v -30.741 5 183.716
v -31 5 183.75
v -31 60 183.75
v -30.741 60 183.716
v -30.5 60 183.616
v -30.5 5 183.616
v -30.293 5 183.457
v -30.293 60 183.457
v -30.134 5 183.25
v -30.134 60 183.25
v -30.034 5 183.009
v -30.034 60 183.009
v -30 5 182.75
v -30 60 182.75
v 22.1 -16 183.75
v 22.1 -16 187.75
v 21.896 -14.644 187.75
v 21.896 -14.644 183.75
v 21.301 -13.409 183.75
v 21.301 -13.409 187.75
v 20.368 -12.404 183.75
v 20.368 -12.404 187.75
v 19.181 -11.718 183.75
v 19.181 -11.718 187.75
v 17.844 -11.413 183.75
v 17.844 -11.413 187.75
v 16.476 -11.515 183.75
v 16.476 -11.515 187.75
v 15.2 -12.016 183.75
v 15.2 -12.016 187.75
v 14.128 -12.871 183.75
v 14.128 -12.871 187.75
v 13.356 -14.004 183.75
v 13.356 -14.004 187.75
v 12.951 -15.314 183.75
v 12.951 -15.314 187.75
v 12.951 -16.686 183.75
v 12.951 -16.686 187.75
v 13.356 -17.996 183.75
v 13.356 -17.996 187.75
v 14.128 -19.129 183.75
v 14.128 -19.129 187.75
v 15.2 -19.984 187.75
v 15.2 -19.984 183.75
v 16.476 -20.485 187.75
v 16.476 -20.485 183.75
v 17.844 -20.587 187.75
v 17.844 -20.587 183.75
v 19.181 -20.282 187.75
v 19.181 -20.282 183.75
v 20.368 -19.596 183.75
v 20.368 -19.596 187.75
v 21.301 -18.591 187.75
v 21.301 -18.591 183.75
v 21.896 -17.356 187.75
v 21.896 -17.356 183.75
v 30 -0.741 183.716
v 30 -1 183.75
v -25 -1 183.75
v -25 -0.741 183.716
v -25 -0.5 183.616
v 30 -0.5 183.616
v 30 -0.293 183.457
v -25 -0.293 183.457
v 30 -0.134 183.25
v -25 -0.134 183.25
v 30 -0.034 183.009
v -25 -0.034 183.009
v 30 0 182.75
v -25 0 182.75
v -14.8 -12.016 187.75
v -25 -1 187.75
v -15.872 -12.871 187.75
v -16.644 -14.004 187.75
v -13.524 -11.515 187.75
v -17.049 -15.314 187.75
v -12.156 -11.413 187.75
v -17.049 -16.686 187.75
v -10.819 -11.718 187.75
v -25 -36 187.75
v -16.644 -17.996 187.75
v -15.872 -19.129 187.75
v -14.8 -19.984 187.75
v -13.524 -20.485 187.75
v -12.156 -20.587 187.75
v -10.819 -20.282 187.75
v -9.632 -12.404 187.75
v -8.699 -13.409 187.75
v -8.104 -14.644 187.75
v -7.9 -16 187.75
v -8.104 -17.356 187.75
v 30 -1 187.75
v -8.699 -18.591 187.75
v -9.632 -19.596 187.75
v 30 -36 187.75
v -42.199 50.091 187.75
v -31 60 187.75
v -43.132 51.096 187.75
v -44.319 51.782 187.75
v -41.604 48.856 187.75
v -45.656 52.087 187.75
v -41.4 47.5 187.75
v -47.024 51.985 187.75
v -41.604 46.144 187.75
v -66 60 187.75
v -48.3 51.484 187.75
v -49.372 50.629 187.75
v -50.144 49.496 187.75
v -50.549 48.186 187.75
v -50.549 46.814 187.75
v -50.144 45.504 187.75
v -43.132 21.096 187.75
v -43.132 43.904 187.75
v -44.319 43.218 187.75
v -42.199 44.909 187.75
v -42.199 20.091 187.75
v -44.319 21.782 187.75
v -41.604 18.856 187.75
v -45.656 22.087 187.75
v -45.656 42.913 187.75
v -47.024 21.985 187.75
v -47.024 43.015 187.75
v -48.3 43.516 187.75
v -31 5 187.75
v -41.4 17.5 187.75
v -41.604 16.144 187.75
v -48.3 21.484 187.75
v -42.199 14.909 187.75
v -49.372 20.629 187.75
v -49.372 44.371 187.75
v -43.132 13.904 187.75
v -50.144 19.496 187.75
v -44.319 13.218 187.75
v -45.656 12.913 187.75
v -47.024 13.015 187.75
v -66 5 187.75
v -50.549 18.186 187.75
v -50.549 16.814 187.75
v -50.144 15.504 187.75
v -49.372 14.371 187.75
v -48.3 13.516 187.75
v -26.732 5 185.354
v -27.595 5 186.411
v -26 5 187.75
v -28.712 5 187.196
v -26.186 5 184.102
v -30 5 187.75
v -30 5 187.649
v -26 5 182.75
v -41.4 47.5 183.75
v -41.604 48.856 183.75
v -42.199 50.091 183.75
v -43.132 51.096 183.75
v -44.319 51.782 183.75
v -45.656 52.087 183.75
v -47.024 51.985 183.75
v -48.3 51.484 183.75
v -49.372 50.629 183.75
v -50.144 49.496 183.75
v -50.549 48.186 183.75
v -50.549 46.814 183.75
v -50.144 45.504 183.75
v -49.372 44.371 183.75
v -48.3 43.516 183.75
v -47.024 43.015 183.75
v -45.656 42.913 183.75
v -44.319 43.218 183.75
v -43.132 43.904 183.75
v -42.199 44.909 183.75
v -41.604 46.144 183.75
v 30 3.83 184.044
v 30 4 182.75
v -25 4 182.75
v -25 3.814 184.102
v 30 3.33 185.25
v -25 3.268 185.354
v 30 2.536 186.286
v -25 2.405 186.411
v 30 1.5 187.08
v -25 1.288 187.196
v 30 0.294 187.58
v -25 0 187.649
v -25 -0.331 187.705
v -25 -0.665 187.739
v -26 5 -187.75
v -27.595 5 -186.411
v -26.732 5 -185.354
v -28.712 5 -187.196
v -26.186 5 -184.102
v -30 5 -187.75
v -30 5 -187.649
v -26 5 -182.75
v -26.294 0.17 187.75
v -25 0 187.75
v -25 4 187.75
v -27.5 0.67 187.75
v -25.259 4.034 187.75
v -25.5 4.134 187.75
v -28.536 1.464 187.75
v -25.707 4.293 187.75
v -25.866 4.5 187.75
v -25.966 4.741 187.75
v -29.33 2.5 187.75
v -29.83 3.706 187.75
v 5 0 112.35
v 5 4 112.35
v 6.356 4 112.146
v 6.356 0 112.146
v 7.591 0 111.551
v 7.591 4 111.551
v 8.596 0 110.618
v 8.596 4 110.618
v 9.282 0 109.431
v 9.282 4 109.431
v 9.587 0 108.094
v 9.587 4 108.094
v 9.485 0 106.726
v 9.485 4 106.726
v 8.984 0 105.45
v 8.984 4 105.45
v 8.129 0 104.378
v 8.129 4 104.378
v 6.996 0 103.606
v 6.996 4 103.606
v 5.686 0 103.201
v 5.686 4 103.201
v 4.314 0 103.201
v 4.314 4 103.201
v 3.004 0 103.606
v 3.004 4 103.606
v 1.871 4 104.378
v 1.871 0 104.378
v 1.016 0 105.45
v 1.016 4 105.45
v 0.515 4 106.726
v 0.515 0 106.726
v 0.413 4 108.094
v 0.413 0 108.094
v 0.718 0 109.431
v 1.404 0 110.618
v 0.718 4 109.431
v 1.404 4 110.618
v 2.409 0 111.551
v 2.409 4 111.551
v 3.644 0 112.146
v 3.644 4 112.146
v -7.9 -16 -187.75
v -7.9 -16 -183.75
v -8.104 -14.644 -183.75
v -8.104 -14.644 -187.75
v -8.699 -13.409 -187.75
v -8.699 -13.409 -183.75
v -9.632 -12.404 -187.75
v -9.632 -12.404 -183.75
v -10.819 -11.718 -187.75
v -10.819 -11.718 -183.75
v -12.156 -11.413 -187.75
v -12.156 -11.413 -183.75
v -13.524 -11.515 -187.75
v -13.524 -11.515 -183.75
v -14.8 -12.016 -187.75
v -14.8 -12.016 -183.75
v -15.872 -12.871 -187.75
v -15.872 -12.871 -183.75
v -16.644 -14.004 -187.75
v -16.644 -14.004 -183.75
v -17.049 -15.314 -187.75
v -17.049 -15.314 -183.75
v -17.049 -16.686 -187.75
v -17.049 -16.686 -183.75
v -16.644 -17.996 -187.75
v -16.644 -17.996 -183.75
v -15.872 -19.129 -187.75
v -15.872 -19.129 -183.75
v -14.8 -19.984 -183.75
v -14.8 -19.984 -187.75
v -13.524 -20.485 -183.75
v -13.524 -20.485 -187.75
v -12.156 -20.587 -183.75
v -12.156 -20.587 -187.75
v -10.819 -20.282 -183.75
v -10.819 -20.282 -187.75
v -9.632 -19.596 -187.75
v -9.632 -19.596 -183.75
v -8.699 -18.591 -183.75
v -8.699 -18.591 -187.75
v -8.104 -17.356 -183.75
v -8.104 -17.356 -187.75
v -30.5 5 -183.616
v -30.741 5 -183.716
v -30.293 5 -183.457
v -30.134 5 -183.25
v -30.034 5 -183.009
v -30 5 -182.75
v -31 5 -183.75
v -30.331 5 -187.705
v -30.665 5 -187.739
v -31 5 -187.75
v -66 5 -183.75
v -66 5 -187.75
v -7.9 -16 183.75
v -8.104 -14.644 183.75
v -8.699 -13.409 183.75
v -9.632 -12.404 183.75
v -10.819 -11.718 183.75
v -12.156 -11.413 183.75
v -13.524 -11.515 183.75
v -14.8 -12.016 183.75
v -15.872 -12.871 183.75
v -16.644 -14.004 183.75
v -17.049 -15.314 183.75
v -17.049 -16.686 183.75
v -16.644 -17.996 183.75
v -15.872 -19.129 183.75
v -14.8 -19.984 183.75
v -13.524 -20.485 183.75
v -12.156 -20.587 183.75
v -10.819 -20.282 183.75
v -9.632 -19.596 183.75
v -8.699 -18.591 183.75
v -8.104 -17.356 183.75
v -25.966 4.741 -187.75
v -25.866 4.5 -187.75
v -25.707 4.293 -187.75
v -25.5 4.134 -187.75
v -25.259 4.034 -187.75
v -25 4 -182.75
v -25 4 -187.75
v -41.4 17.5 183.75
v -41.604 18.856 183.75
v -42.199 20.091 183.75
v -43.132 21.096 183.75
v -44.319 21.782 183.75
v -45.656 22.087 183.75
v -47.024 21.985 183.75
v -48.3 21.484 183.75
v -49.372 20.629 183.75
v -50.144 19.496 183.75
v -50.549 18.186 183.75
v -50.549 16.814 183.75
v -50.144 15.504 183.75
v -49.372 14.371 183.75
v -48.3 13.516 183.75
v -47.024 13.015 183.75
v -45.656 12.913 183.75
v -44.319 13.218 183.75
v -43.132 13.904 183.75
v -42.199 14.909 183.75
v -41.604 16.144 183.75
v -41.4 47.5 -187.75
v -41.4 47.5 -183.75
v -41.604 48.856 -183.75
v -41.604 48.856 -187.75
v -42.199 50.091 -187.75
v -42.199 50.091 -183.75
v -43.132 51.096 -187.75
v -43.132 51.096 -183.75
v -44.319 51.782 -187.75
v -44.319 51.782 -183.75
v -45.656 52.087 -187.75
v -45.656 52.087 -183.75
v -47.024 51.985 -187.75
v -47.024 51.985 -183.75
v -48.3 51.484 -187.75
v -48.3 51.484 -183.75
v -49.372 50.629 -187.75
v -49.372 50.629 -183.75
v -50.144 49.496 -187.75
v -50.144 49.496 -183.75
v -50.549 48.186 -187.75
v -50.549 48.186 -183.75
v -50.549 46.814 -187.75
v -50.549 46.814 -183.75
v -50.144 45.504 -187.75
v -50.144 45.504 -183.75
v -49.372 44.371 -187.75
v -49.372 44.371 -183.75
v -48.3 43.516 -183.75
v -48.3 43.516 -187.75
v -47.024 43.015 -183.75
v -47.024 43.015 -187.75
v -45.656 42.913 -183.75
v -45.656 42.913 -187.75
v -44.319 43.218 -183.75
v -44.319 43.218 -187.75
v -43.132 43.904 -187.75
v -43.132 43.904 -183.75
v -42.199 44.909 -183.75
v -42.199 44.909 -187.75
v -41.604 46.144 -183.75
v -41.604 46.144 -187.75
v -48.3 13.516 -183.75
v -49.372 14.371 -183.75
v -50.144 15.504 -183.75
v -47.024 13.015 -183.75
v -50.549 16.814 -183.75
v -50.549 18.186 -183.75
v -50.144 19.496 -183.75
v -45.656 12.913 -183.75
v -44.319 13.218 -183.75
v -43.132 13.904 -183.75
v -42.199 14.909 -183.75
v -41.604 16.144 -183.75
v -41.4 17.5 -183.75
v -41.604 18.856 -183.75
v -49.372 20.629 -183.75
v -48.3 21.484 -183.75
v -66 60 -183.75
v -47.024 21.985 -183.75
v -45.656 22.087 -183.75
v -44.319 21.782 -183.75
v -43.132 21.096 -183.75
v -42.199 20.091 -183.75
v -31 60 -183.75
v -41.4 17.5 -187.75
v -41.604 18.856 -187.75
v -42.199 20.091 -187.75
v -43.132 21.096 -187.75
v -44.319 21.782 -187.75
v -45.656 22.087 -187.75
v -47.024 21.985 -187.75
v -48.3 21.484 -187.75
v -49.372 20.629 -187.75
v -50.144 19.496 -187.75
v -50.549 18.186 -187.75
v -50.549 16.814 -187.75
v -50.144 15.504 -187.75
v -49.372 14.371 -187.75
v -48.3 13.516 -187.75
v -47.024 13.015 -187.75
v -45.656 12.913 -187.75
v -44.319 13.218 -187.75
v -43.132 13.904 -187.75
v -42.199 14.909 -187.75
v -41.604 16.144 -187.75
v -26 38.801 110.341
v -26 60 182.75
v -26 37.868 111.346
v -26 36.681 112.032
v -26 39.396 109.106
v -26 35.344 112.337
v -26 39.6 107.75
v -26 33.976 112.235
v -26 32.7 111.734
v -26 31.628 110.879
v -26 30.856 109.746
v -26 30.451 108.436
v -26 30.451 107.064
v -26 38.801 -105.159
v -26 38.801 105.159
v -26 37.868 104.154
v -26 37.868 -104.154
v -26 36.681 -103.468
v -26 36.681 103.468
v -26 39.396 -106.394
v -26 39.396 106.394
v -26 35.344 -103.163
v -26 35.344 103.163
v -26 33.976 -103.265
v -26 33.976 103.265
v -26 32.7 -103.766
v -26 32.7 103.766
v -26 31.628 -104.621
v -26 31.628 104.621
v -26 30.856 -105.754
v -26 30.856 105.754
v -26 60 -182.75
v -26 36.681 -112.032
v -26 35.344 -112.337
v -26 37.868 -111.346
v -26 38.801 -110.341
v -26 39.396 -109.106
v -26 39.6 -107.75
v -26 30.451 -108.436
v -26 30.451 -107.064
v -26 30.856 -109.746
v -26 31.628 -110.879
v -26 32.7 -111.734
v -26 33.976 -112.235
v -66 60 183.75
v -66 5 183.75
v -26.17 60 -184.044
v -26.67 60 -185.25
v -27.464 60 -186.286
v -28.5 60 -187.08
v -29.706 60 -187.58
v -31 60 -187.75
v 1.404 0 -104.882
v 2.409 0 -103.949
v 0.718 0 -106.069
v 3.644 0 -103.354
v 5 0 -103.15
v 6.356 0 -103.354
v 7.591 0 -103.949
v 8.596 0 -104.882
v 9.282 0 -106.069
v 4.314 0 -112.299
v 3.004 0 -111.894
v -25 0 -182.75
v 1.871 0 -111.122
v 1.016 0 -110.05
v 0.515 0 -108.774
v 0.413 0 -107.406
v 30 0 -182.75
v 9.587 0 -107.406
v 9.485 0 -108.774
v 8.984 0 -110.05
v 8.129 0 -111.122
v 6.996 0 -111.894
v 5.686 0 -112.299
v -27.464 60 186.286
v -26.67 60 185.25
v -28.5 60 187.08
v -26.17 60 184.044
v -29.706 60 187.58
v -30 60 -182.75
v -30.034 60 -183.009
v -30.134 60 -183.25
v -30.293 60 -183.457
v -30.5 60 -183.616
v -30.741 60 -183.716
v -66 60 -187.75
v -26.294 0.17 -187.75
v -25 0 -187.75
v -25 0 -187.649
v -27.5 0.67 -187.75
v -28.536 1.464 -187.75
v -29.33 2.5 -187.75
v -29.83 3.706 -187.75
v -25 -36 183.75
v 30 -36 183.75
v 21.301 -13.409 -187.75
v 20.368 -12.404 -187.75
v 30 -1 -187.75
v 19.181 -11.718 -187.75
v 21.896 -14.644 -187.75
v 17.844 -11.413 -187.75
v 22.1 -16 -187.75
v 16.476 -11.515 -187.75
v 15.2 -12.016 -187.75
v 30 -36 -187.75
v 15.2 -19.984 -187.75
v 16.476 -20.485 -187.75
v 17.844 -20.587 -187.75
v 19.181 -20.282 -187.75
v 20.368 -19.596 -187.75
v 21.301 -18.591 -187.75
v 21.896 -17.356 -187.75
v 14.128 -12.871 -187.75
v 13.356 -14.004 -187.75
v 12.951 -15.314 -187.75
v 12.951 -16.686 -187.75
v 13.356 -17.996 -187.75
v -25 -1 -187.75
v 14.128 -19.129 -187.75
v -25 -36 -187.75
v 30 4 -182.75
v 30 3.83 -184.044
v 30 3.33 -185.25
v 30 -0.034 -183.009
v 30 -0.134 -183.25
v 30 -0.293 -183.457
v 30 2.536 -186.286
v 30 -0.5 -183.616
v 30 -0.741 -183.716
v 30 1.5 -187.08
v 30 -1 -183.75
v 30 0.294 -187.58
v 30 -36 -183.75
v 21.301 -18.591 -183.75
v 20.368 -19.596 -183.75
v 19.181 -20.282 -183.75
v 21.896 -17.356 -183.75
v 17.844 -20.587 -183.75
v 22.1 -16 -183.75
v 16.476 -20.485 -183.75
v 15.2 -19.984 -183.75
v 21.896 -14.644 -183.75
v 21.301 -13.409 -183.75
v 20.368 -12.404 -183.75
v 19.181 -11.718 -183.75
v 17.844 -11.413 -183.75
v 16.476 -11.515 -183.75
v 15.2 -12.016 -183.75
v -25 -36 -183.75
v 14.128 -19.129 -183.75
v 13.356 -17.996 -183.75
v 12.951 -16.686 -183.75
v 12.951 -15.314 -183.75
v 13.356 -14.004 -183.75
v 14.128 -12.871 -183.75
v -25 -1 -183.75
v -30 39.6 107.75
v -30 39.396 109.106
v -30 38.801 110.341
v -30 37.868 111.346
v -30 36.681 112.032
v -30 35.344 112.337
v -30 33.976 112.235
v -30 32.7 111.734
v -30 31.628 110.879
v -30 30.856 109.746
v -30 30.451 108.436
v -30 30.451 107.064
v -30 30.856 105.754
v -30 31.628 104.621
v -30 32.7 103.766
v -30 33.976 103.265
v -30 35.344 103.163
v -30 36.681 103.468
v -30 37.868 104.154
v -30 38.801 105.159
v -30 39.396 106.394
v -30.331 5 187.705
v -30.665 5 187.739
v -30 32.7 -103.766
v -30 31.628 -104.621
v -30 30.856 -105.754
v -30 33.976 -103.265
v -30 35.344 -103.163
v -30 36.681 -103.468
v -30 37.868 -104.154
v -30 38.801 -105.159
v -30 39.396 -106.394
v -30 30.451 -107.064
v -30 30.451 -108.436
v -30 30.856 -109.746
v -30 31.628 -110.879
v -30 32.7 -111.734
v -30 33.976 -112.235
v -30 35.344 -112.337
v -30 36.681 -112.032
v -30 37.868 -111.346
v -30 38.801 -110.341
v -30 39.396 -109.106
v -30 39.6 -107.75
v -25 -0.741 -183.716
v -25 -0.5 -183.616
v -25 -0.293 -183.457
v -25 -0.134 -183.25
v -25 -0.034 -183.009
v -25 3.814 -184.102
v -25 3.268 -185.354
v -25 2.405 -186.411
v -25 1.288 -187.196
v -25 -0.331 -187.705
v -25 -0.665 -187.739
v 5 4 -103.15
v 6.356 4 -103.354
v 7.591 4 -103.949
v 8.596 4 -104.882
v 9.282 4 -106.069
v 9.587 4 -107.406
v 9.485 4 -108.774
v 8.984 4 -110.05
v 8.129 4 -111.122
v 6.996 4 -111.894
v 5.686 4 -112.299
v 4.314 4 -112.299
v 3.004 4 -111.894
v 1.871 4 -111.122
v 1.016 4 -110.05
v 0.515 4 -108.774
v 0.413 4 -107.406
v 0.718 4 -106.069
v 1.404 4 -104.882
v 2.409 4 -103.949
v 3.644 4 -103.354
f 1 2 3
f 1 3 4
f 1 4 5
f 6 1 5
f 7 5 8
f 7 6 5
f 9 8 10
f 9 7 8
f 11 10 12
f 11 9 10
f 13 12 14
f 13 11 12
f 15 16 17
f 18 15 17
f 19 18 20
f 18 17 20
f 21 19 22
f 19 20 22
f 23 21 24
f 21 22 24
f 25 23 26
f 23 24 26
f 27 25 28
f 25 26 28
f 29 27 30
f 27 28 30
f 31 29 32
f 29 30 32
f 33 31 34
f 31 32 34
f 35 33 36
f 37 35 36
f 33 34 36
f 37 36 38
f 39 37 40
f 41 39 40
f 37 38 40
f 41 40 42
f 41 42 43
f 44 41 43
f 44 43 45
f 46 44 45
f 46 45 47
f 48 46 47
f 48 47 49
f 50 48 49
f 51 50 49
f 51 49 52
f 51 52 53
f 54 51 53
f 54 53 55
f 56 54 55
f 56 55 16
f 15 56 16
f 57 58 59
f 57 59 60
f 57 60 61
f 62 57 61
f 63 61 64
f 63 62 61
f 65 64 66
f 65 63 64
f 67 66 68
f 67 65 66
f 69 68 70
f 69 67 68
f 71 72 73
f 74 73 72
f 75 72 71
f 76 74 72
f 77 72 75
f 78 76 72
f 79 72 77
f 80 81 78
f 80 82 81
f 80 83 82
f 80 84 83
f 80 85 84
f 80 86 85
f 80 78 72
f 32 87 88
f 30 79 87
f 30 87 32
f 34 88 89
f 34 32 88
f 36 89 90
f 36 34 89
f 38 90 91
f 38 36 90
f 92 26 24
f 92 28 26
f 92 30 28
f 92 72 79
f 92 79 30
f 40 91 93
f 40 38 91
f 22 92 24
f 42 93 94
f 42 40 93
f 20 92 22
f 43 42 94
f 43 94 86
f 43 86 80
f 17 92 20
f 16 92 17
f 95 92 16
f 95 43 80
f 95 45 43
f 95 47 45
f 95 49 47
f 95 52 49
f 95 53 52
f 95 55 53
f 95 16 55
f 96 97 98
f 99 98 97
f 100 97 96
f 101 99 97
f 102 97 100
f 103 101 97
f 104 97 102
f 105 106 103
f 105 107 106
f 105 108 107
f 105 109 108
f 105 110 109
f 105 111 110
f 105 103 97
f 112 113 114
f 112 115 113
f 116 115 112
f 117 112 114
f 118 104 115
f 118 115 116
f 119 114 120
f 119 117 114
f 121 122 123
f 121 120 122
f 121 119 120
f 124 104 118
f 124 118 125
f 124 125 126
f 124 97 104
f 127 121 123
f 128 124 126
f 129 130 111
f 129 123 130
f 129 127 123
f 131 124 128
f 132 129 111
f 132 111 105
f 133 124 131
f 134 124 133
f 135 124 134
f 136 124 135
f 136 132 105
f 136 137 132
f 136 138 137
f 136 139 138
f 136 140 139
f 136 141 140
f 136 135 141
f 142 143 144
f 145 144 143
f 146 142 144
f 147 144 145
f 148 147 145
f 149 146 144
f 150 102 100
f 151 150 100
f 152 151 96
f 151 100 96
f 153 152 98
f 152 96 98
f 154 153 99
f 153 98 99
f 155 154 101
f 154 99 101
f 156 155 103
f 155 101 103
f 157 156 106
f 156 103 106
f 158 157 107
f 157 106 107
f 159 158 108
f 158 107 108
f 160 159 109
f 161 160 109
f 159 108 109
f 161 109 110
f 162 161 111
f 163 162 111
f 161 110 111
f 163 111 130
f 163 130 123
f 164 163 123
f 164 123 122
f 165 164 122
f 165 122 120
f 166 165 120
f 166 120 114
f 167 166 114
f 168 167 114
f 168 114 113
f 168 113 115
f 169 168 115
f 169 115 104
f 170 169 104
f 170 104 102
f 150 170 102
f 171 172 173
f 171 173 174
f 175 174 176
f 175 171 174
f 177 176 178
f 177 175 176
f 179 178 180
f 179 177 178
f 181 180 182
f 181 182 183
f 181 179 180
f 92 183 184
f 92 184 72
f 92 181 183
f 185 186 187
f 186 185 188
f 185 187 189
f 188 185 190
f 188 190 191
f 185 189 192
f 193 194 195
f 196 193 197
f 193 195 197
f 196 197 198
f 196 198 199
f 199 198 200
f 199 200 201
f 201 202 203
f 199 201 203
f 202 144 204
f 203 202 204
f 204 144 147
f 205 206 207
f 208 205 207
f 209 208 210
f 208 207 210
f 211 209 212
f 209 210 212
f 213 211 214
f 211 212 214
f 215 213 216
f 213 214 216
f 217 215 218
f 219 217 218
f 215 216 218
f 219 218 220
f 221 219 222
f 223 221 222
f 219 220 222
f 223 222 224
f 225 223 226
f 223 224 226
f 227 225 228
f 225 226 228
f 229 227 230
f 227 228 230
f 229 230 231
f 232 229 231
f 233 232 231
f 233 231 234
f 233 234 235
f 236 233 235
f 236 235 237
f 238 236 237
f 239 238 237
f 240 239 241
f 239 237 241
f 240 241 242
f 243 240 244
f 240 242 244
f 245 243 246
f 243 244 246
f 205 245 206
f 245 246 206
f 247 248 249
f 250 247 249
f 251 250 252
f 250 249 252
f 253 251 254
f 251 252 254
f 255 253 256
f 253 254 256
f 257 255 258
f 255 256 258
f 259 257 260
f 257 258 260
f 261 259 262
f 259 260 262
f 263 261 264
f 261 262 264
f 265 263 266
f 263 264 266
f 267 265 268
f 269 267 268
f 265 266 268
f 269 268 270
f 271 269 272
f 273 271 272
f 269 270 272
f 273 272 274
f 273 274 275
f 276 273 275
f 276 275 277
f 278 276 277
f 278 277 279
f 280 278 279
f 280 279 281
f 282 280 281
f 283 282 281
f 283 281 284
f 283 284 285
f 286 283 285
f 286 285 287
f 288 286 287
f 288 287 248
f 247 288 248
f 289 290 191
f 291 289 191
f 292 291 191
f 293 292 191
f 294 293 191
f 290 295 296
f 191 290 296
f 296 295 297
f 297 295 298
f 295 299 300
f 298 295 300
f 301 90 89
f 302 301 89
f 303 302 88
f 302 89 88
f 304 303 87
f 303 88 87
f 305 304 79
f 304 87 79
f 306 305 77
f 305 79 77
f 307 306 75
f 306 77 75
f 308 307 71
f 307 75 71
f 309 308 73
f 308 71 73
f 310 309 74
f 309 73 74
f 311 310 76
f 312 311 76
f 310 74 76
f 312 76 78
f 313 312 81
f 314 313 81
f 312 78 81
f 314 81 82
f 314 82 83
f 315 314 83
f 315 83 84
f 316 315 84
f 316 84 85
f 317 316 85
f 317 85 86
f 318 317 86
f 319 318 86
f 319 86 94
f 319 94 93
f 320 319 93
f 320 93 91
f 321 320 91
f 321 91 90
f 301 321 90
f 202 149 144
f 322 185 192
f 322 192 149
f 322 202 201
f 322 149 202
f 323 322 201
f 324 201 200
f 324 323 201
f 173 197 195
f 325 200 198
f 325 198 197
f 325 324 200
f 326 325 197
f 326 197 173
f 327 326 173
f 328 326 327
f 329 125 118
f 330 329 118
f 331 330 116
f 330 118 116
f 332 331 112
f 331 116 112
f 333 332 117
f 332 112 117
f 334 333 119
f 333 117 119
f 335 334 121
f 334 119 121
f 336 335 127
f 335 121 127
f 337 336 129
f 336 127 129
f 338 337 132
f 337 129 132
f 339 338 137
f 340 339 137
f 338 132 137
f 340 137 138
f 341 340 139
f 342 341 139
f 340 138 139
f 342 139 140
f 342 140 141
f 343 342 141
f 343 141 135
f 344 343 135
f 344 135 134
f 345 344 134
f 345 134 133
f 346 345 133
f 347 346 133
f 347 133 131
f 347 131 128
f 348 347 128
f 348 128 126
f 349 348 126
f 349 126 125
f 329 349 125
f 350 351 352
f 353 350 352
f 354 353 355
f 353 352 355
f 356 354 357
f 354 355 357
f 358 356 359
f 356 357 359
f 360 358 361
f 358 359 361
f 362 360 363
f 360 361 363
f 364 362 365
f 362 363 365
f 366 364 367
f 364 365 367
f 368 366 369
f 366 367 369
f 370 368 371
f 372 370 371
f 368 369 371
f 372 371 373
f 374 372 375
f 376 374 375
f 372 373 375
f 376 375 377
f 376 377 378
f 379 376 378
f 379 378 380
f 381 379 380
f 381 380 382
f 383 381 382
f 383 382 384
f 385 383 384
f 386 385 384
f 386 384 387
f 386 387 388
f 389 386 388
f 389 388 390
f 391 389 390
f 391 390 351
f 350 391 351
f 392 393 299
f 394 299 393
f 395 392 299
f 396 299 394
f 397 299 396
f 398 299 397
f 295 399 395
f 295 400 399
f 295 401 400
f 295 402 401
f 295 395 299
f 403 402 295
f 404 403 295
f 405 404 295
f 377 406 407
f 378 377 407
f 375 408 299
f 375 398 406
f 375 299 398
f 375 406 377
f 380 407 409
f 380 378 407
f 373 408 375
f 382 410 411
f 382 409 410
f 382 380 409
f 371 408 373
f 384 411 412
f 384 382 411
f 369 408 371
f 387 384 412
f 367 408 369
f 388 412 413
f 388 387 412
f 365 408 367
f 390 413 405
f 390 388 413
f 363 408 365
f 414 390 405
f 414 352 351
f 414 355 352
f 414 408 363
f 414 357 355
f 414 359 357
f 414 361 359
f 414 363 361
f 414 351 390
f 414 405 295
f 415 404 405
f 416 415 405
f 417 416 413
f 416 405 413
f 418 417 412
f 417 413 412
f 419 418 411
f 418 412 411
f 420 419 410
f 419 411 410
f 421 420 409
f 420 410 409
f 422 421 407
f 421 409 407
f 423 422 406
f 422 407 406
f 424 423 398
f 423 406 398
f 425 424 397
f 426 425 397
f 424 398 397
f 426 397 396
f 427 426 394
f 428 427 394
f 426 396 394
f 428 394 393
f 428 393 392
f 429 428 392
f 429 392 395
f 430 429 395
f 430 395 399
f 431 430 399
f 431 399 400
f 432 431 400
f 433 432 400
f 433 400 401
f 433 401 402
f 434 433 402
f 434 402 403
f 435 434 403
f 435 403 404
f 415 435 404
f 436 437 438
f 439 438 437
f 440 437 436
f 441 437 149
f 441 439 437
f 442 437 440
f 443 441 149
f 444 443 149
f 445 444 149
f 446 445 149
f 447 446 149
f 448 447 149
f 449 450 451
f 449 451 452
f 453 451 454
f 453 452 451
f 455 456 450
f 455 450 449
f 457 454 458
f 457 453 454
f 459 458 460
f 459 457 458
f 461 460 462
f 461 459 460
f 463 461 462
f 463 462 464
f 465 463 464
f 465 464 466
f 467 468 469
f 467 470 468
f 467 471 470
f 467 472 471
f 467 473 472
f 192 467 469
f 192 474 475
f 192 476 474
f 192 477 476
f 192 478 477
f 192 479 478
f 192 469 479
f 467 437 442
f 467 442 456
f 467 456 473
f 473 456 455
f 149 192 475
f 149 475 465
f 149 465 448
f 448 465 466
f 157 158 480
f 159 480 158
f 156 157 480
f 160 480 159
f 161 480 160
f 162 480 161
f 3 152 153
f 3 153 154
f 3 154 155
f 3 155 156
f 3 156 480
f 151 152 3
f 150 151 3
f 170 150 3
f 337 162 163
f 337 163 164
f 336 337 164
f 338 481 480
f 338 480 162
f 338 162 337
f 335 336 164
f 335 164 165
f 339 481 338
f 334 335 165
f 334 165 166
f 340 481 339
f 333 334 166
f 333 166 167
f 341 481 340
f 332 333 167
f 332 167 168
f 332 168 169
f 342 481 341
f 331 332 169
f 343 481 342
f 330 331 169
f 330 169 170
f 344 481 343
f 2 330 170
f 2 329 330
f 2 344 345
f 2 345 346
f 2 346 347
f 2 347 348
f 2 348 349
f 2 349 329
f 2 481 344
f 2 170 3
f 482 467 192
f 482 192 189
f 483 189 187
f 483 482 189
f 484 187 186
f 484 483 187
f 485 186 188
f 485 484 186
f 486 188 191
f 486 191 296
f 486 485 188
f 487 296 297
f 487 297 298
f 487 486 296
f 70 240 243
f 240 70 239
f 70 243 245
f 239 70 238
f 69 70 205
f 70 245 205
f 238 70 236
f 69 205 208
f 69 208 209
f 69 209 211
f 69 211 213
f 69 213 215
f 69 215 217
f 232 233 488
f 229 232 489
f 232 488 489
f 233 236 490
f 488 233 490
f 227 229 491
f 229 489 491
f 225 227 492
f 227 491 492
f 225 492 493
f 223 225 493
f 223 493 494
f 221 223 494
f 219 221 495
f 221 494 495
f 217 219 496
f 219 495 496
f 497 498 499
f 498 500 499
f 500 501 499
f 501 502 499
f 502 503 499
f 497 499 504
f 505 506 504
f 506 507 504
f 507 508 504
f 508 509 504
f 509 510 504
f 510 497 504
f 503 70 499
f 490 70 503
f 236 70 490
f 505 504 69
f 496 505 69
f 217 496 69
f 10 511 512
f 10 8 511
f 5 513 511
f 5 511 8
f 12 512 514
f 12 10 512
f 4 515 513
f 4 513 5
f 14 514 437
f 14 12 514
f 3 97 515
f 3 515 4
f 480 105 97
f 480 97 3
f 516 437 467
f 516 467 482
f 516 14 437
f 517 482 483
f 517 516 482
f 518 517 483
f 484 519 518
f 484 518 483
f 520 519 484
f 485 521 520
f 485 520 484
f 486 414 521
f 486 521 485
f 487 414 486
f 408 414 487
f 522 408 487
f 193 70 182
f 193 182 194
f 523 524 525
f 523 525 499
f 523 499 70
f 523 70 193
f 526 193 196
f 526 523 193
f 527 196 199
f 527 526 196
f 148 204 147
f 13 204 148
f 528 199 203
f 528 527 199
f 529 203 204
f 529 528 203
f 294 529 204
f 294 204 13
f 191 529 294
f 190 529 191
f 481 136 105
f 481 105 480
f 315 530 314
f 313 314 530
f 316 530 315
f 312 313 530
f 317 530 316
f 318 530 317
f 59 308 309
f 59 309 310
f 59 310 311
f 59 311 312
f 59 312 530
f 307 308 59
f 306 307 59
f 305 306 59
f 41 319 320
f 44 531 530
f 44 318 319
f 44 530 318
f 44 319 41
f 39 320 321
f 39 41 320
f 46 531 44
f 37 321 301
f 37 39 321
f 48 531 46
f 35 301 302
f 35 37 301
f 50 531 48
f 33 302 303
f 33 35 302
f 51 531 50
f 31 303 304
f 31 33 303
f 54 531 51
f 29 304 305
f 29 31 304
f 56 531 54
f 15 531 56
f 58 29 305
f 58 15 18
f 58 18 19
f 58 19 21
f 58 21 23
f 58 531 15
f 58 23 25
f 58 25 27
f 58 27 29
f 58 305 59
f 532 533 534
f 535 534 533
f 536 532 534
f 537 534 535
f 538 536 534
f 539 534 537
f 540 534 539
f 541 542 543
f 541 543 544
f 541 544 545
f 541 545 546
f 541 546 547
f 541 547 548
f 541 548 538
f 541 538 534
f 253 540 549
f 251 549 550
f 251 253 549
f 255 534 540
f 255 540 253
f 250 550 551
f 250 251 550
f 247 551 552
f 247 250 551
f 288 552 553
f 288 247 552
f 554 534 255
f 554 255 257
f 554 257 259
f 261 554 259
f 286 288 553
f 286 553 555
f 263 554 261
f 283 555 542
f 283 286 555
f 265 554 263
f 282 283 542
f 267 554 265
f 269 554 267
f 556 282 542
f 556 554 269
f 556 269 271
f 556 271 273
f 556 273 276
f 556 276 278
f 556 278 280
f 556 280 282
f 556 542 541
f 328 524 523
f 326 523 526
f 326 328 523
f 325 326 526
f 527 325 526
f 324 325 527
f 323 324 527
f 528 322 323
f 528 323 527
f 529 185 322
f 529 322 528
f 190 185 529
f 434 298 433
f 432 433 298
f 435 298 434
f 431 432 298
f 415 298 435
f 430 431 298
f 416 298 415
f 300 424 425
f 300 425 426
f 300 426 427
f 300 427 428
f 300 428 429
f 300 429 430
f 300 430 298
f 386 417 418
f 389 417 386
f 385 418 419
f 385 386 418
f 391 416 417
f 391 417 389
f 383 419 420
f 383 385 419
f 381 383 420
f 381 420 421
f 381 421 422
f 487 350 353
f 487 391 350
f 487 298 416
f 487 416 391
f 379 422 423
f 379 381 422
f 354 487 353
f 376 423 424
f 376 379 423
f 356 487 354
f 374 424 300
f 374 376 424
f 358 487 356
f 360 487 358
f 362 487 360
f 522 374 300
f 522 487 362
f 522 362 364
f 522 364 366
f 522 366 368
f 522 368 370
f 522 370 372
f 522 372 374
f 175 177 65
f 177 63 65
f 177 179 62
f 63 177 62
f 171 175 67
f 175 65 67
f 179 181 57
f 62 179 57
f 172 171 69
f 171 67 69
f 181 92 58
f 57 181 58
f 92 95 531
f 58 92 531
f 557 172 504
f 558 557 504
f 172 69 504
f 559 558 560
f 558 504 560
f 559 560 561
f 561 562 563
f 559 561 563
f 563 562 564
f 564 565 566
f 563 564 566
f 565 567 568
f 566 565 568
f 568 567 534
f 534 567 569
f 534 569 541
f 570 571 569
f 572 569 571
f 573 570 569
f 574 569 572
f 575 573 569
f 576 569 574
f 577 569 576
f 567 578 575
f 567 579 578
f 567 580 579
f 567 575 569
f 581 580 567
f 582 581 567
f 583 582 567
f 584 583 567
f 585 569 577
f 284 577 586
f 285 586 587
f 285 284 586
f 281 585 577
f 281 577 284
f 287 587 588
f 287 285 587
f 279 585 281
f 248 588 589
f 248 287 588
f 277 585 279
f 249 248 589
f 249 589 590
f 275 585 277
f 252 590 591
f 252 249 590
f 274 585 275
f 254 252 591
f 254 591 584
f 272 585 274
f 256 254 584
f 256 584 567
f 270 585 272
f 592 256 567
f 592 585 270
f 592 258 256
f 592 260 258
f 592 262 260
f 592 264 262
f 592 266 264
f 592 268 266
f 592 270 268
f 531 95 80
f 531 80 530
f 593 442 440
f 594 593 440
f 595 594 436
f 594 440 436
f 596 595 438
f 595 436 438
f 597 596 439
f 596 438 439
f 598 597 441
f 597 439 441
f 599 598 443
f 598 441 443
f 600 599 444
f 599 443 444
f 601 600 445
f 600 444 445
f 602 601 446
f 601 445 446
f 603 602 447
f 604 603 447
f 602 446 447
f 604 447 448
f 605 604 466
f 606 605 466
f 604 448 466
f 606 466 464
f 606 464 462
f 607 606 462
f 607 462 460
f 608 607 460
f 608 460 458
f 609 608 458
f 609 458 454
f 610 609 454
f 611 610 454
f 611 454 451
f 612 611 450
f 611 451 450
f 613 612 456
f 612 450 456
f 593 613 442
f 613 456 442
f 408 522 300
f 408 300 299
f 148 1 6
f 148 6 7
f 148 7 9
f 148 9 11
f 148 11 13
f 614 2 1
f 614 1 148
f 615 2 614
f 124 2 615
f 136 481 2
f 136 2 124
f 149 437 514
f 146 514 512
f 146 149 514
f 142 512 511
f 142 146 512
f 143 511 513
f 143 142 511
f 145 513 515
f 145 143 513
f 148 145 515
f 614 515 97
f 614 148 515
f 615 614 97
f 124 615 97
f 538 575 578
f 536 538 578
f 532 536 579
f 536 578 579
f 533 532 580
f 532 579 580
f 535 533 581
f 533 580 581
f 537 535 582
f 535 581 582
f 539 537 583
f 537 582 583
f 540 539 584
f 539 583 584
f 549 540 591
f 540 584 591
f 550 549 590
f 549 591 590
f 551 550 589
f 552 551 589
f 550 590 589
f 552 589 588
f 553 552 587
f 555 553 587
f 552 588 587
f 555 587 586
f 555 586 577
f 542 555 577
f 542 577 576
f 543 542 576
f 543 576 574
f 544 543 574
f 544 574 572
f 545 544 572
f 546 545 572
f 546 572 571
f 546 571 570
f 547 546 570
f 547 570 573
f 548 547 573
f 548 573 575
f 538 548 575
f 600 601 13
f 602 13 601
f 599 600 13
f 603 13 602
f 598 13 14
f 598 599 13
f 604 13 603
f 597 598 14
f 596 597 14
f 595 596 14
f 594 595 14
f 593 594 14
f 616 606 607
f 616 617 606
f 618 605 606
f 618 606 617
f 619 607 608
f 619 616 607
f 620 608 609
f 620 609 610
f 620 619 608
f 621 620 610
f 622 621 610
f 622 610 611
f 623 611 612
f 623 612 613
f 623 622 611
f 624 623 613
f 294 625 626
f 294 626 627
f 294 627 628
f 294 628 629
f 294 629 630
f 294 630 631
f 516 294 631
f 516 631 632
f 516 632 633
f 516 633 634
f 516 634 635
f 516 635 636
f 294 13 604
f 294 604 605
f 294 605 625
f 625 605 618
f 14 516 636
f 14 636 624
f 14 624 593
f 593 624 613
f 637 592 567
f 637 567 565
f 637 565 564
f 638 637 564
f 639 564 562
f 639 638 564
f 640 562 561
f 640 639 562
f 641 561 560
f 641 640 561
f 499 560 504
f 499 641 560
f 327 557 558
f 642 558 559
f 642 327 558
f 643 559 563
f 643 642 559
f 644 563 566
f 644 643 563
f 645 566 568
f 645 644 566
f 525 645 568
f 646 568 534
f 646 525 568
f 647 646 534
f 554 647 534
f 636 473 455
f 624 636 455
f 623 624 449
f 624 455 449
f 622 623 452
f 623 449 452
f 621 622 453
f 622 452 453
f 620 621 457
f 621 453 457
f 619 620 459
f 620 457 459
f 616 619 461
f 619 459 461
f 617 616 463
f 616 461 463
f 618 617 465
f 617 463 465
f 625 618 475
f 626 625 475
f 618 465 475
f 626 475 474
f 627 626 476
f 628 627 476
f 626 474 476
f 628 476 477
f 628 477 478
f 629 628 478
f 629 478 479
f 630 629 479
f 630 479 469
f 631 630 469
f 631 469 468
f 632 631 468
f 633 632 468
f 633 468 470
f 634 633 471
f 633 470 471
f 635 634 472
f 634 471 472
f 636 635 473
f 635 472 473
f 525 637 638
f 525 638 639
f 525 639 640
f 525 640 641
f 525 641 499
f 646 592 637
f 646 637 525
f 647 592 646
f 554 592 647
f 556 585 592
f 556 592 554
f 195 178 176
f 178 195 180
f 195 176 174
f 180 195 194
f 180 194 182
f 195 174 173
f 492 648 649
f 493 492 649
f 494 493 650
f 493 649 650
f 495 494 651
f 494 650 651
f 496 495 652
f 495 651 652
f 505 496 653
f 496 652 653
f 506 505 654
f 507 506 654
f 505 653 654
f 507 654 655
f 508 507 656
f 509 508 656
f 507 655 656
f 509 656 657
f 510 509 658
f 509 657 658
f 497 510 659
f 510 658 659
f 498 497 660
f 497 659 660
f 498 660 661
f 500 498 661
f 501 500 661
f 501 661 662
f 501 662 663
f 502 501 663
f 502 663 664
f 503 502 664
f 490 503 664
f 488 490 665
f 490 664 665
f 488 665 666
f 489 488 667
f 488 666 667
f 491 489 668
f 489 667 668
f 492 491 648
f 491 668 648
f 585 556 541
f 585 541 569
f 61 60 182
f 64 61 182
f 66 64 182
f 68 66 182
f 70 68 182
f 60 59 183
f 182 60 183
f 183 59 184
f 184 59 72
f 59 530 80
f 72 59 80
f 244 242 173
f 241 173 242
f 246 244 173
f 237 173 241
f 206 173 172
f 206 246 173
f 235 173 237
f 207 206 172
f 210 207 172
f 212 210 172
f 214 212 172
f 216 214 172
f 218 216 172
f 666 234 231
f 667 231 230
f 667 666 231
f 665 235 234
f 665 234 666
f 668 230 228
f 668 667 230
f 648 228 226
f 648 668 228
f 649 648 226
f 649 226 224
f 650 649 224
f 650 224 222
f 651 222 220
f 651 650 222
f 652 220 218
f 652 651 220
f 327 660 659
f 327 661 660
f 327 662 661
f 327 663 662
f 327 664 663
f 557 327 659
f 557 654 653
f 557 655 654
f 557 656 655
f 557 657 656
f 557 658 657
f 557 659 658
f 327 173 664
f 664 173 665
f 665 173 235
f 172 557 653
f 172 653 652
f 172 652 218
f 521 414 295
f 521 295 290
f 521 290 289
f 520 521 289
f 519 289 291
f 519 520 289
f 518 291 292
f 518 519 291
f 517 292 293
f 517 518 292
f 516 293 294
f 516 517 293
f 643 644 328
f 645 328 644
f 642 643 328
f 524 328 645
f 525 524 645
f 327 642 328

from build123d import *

# Parameters (mm, degrees)
SKETCH1_W                      = 60
SKETCH1_H                      = 375.5
BASE_FLANGE1_DEPTH             = 4
EDGE_FLANGE1_STRIP_W           = 18
EDGE_FLANGE1_STRIP_H           = 4
EDGE_FLANGE1_STRIP_CUT_DEPTH   = 375.5
EDGE_FLANGE1_DEPTH             = 375.5
EDGE_FLANGE2_STRIP_W           = 18
EDGE_FLANGE2_STRIP_H           = 4
EDGE_FLANGE2_STRIP_CUT_DEPTH   = 55
EDGE_FLANGE2_STRIP_2_W         = 18
EDGE_FLANGE2_STRIP_2_H         = 4
EDGE_FLANGE2_STRIP_CUT_2_DEPTH = 55
EDGE_FLANGE2_STRIP_3_W         = 18
EDGE_FLANGE2_STRIP_3_H         = 4
EDGE_FLANGE2_STRIP_CUT_3_DEPTH = 55
EDGE_FLANGE2_STRIP_4_W         = 18
EDGE_FLANGE2_STRIP_4_H         = 4
EDGE_FLANGE2_STRIP_CUT_4_DEPTH = 55
EDGE_FLANGE2_DEPTH             = 55
EDGE_FLANGE2_BEND_DEPTH        = 55
EDGE_FLANGE2_BEND_2_DEPTH      = 55
EDGE_FLANGE2_BEND_3_DEPTH      = 55
SKETCH18_R                     = 4.6
EXTRUDE1_DEPTH                 = 386.948506928
SKETCH19_R                     = 4.6
EXTRUDE2_DEPTH                 = 4
SKETCH20_R                     = 4.6
EXTRUDE3_DEPTH                 = 4


# Sheet-metal steps are written as plain solids
with BuildPart() as part:
    # Sketch1 → Base-Flange1 (new body)
    with BuildSketch(Plane(origin=(0, 0, 0), x_dir=(1, 0, 0), z_dir=(0, 1, 0))):
        Rectangle(SKETCH1_W, SKETCH1_H)
    extrude(amount=BASE_FLANGE1_DEPTH)

    # Edge-Flange1 strip (across the edge) → Edge-Flange1 strip cut (cut)
    with BuildSketch(Plane(origin=(-30, 4, -187.75), x_dir=(1, 0, 0), z_dir=(0, 0, 1))):
        with Locations((-4, -2)):
            Rectangle(EDGE_FLANGE1_STRIP_W, EDGE_FLANGE1_STRIP_H)
    extrude(amount=EDGE_FLANGE1_STRIP_CUT_DEPTH, mode=Mode.SUBTRACT)

    # Edge-Flange1 section (across the edge) → Edge-Flange1 (add)
    with BuildSketch(Plane(origin=(-30, 4, -187.75), x_dir=(1, 0, 0), z_dir=(0, 0, 1))):
        with BuildLine():
            Line((0, 1), (0, 56))
            Line((0, 56), (4, 56))
            Line((4, 56), (4, 1))
            ThreePointArc((4, 1), (4.292893219, 0.292893219), (5, 0))
            Line((5, 0), (5, -4))
            ThreePointArc((5, -4), (1.464466094, -2.535533906), (0, 1))
        make_face()
    extrude(amount=EDGE_FLANGE1_DEPTH)

    # Edge-Flange2 strip (across the edge) → Edge-Flange2 strip cut (cut)
    with BuildSketch(Plane(origin=(-30, 5, 187.75), x_dir=(0, 0, -1), z_dir=(0, 1, 0))):
        with Locations((-4, -2)):
            Rectangle(EDGE_FLANGE2_STRIP_W, EDGE_FLANGE2_STRIP_H)
    extrude(amount=EDGE_FLANGE2_STRIP_CUT_DEPTH, mode=Mode.SUBTRACT)

    # Edge-Flange2 strip 2 (across the edge) → Edge-Flange2 strip cut 2 (cut)
    with BuildSketch(Plane(origin=(30, 0, 187.75), x_dir=(0, 0, -1), z_dir=(-1, 0, 0))):
        with Locations((-4, -2)):
            Rectangle(EDGE_FLANGE2_STRIP_2_W, EDGE_FLANGE2_STRIP_2_H)
    extrude(amount=EDGE_FLANGE2_STRIP_CUT_2_DEPTH, mode=Mode.SUBTRACT)

    # Edge-Flange2 strip 3 (across the edge) → Edge-Flange2 strip cut 3 (cut)
    with BuildSketch(Plane(origin=(-30, 60, -187.75), x_dir=(0, 0, 1), z_dir=(0, -1, 0))):
        with Locations((-4, -2)):
            Rectangle(EDGE_FLANGE2_STRIP_3_W, EDGE_FLANGE2_STRIP_3_H)
    extrude(amount=EDGE_FLANGE2_STRIP_CUT_3_DEPTH, mode=Mode.SUBTRACT)

    # Edge-Flange2 strip 4 (across the edge) → Edge-Flange2 strip cut 4 (cut)
    with BuildSketch(Plane(origin=(-25, 0, -187.75), x_dir=(0, 0, 1), z_dir=(1, 0, 0))):
        with Locations((-4, -2)):
            Rectangle(EDGE_FLANGE2_STRIP_4_W, EDGE_FLANGE2_STRIP_4_H)
    extrude(amount=EDGE_FLANGE2_STRIP_CUT_4_DEPTH, mode=Mode.SUBTRACT)

    # Edge-Flange2 section (across the edge) → Edge-Flange2 (add)
    with BuildSketch(Plane(origin=(-30, 5, 187.75), x_dir=(0, 0, -1), z_dir=(0, 1, 0))):
        with BuildLine():
            Line((0, 1), (0, 36))
            Line((0, 36), (4, 36))
            Line((4, 36), (4, 1))
            ThreePointArc((4, 1), (4.292893219, 0.292893219), (5, 0))
            Line((5, 0), (5, -4))
            ThreePointArc((5, -4), (1.464466094, -2.535533906), (0, 1))
        make_face()
    extrude(amount=EDGE_FLANGE2_DEPTH)

    # Edge-Flange2 section 2 (across the edge) → Edge-Flange2 bend (add)
    with BuildSketch(Plane(origin=(30, 0, 187.75), x_dir=(0, 0, -1), z_dir=(-1, 0, 0))):
        with BuildLine():
            Line((0, 1), (0, 36))
            Line((0, 36), (4, 36))
            Line((4, 36), (4, 1))
            ThreePointArc((4, 1), (4.292893219, 0.292893219), (5, 0))
            Line((5, 0), (5, -4))
            ThreePointArc((5, -4), (1.464466094, -2.535533906), (0, 1))
        make_face()
    extrude(amount=EDGE_FLANGE2_BEND_DEPTH)

    # Edge-Flange2 section 3 (across the edge) → Edge-Flange2 bend 2 (add)
    with BuildSketch(Plane(origin=(-30, 60, -187.75), x_dir=(0, 0, 1), z_dir=(0, -1, 0))):
        with BuildLine():
            Line((0, 1), (0, 36))
            Line((0, 36), (4, 36))
            Line((4, 36), (4, 1))
            ThreePointArc((4, 1), (4.292893219, 0.292893219), (5, 0))
            Line((5, 0), (5, -4))
            ThreePointArc((5, -4), (1.464466094, -2.535533906), (0, 1))
        make_face()
    extrude(amount=EDGE_FLANGE2_BEND_2_DEPTH)

    # Edge-Flange2 section 4 (across the edge) → Edge-Flange2 bend 3 (add)
    with BuildSketch(Plane(origin=(-25, 0, -187.75), x_dir=(0, 0, 1), z_dir=(1, 0, 0))):
        with BuildLine():
            Line((0, 1), (0, 36))
            Line((0, 36), (4, 36))
            Line((4, 36), (4, 1))
            ThreePointArc((4, 1), (4.292893219, 0.292893219), (5, 0))
            Line((5, 0), (5, -4))
            ThreePointArc((5, -4), (1.464466094, -2.535533906), (0, 1))
        make_face()
    extrude(amount=EDGE_FLANGE2_BEND_3_DEPTH)

    # Sketch18 → Extrude1 (cut, through all)
    with BuildSketch(Plane.XY.offset(187.75)):
        with Locations((-46, 47.5)):
            Circle(SKETCH18_R)
        with Locations((-46, 17.5)):
            Circle(SKETCH18_R)
        with Locations((-12.5, -16)):
            Circle(SKETCH18_R)
        with Locations((17.5, -16)):
            Circle(SKETCH18_R)
    extrude(amount=-EXTRUDE1_DEPTH, mode=Mode.SUBTRACT)

    # Sketch19 → Extrude2 (cut)
    with BuildSketch(Plane(origin=(-26, 0, 0), x_dir=(0, 0, -1), z_dir=(1, 0, 0))):
        with Locations(Location((-107.75, 35, 0), (0, 0, 90))):
            Circle(SKETCH19_R)
        with Locations(Location((107.75, 35, 0), (0, 0, 90))):
            Circle(SKETCH19_R)
    extrude(amount=-EXTRUDE2_DEPTH, mode=Mode.SUBTRACT)

    # Sketch20 → Extrude3 (cut)
    with BuildSketch(Plane(origin=(0, 4, 0), x_dir=(1, 0, 0), z_dir=(0, 1, 0))):
        with Locations(Location((5, 107.75, 0), (0, 0, 270))):
            Circle(SKETCH20_R)
        with Locations(Location((5, -107.75, 0), (0, 0, 270))):
            Circle(SKETCH20_R)
    extrude(amount=-EXTRUDE3_DEPTH, mode=Mode.SUBTRACT)


solid = part.part
